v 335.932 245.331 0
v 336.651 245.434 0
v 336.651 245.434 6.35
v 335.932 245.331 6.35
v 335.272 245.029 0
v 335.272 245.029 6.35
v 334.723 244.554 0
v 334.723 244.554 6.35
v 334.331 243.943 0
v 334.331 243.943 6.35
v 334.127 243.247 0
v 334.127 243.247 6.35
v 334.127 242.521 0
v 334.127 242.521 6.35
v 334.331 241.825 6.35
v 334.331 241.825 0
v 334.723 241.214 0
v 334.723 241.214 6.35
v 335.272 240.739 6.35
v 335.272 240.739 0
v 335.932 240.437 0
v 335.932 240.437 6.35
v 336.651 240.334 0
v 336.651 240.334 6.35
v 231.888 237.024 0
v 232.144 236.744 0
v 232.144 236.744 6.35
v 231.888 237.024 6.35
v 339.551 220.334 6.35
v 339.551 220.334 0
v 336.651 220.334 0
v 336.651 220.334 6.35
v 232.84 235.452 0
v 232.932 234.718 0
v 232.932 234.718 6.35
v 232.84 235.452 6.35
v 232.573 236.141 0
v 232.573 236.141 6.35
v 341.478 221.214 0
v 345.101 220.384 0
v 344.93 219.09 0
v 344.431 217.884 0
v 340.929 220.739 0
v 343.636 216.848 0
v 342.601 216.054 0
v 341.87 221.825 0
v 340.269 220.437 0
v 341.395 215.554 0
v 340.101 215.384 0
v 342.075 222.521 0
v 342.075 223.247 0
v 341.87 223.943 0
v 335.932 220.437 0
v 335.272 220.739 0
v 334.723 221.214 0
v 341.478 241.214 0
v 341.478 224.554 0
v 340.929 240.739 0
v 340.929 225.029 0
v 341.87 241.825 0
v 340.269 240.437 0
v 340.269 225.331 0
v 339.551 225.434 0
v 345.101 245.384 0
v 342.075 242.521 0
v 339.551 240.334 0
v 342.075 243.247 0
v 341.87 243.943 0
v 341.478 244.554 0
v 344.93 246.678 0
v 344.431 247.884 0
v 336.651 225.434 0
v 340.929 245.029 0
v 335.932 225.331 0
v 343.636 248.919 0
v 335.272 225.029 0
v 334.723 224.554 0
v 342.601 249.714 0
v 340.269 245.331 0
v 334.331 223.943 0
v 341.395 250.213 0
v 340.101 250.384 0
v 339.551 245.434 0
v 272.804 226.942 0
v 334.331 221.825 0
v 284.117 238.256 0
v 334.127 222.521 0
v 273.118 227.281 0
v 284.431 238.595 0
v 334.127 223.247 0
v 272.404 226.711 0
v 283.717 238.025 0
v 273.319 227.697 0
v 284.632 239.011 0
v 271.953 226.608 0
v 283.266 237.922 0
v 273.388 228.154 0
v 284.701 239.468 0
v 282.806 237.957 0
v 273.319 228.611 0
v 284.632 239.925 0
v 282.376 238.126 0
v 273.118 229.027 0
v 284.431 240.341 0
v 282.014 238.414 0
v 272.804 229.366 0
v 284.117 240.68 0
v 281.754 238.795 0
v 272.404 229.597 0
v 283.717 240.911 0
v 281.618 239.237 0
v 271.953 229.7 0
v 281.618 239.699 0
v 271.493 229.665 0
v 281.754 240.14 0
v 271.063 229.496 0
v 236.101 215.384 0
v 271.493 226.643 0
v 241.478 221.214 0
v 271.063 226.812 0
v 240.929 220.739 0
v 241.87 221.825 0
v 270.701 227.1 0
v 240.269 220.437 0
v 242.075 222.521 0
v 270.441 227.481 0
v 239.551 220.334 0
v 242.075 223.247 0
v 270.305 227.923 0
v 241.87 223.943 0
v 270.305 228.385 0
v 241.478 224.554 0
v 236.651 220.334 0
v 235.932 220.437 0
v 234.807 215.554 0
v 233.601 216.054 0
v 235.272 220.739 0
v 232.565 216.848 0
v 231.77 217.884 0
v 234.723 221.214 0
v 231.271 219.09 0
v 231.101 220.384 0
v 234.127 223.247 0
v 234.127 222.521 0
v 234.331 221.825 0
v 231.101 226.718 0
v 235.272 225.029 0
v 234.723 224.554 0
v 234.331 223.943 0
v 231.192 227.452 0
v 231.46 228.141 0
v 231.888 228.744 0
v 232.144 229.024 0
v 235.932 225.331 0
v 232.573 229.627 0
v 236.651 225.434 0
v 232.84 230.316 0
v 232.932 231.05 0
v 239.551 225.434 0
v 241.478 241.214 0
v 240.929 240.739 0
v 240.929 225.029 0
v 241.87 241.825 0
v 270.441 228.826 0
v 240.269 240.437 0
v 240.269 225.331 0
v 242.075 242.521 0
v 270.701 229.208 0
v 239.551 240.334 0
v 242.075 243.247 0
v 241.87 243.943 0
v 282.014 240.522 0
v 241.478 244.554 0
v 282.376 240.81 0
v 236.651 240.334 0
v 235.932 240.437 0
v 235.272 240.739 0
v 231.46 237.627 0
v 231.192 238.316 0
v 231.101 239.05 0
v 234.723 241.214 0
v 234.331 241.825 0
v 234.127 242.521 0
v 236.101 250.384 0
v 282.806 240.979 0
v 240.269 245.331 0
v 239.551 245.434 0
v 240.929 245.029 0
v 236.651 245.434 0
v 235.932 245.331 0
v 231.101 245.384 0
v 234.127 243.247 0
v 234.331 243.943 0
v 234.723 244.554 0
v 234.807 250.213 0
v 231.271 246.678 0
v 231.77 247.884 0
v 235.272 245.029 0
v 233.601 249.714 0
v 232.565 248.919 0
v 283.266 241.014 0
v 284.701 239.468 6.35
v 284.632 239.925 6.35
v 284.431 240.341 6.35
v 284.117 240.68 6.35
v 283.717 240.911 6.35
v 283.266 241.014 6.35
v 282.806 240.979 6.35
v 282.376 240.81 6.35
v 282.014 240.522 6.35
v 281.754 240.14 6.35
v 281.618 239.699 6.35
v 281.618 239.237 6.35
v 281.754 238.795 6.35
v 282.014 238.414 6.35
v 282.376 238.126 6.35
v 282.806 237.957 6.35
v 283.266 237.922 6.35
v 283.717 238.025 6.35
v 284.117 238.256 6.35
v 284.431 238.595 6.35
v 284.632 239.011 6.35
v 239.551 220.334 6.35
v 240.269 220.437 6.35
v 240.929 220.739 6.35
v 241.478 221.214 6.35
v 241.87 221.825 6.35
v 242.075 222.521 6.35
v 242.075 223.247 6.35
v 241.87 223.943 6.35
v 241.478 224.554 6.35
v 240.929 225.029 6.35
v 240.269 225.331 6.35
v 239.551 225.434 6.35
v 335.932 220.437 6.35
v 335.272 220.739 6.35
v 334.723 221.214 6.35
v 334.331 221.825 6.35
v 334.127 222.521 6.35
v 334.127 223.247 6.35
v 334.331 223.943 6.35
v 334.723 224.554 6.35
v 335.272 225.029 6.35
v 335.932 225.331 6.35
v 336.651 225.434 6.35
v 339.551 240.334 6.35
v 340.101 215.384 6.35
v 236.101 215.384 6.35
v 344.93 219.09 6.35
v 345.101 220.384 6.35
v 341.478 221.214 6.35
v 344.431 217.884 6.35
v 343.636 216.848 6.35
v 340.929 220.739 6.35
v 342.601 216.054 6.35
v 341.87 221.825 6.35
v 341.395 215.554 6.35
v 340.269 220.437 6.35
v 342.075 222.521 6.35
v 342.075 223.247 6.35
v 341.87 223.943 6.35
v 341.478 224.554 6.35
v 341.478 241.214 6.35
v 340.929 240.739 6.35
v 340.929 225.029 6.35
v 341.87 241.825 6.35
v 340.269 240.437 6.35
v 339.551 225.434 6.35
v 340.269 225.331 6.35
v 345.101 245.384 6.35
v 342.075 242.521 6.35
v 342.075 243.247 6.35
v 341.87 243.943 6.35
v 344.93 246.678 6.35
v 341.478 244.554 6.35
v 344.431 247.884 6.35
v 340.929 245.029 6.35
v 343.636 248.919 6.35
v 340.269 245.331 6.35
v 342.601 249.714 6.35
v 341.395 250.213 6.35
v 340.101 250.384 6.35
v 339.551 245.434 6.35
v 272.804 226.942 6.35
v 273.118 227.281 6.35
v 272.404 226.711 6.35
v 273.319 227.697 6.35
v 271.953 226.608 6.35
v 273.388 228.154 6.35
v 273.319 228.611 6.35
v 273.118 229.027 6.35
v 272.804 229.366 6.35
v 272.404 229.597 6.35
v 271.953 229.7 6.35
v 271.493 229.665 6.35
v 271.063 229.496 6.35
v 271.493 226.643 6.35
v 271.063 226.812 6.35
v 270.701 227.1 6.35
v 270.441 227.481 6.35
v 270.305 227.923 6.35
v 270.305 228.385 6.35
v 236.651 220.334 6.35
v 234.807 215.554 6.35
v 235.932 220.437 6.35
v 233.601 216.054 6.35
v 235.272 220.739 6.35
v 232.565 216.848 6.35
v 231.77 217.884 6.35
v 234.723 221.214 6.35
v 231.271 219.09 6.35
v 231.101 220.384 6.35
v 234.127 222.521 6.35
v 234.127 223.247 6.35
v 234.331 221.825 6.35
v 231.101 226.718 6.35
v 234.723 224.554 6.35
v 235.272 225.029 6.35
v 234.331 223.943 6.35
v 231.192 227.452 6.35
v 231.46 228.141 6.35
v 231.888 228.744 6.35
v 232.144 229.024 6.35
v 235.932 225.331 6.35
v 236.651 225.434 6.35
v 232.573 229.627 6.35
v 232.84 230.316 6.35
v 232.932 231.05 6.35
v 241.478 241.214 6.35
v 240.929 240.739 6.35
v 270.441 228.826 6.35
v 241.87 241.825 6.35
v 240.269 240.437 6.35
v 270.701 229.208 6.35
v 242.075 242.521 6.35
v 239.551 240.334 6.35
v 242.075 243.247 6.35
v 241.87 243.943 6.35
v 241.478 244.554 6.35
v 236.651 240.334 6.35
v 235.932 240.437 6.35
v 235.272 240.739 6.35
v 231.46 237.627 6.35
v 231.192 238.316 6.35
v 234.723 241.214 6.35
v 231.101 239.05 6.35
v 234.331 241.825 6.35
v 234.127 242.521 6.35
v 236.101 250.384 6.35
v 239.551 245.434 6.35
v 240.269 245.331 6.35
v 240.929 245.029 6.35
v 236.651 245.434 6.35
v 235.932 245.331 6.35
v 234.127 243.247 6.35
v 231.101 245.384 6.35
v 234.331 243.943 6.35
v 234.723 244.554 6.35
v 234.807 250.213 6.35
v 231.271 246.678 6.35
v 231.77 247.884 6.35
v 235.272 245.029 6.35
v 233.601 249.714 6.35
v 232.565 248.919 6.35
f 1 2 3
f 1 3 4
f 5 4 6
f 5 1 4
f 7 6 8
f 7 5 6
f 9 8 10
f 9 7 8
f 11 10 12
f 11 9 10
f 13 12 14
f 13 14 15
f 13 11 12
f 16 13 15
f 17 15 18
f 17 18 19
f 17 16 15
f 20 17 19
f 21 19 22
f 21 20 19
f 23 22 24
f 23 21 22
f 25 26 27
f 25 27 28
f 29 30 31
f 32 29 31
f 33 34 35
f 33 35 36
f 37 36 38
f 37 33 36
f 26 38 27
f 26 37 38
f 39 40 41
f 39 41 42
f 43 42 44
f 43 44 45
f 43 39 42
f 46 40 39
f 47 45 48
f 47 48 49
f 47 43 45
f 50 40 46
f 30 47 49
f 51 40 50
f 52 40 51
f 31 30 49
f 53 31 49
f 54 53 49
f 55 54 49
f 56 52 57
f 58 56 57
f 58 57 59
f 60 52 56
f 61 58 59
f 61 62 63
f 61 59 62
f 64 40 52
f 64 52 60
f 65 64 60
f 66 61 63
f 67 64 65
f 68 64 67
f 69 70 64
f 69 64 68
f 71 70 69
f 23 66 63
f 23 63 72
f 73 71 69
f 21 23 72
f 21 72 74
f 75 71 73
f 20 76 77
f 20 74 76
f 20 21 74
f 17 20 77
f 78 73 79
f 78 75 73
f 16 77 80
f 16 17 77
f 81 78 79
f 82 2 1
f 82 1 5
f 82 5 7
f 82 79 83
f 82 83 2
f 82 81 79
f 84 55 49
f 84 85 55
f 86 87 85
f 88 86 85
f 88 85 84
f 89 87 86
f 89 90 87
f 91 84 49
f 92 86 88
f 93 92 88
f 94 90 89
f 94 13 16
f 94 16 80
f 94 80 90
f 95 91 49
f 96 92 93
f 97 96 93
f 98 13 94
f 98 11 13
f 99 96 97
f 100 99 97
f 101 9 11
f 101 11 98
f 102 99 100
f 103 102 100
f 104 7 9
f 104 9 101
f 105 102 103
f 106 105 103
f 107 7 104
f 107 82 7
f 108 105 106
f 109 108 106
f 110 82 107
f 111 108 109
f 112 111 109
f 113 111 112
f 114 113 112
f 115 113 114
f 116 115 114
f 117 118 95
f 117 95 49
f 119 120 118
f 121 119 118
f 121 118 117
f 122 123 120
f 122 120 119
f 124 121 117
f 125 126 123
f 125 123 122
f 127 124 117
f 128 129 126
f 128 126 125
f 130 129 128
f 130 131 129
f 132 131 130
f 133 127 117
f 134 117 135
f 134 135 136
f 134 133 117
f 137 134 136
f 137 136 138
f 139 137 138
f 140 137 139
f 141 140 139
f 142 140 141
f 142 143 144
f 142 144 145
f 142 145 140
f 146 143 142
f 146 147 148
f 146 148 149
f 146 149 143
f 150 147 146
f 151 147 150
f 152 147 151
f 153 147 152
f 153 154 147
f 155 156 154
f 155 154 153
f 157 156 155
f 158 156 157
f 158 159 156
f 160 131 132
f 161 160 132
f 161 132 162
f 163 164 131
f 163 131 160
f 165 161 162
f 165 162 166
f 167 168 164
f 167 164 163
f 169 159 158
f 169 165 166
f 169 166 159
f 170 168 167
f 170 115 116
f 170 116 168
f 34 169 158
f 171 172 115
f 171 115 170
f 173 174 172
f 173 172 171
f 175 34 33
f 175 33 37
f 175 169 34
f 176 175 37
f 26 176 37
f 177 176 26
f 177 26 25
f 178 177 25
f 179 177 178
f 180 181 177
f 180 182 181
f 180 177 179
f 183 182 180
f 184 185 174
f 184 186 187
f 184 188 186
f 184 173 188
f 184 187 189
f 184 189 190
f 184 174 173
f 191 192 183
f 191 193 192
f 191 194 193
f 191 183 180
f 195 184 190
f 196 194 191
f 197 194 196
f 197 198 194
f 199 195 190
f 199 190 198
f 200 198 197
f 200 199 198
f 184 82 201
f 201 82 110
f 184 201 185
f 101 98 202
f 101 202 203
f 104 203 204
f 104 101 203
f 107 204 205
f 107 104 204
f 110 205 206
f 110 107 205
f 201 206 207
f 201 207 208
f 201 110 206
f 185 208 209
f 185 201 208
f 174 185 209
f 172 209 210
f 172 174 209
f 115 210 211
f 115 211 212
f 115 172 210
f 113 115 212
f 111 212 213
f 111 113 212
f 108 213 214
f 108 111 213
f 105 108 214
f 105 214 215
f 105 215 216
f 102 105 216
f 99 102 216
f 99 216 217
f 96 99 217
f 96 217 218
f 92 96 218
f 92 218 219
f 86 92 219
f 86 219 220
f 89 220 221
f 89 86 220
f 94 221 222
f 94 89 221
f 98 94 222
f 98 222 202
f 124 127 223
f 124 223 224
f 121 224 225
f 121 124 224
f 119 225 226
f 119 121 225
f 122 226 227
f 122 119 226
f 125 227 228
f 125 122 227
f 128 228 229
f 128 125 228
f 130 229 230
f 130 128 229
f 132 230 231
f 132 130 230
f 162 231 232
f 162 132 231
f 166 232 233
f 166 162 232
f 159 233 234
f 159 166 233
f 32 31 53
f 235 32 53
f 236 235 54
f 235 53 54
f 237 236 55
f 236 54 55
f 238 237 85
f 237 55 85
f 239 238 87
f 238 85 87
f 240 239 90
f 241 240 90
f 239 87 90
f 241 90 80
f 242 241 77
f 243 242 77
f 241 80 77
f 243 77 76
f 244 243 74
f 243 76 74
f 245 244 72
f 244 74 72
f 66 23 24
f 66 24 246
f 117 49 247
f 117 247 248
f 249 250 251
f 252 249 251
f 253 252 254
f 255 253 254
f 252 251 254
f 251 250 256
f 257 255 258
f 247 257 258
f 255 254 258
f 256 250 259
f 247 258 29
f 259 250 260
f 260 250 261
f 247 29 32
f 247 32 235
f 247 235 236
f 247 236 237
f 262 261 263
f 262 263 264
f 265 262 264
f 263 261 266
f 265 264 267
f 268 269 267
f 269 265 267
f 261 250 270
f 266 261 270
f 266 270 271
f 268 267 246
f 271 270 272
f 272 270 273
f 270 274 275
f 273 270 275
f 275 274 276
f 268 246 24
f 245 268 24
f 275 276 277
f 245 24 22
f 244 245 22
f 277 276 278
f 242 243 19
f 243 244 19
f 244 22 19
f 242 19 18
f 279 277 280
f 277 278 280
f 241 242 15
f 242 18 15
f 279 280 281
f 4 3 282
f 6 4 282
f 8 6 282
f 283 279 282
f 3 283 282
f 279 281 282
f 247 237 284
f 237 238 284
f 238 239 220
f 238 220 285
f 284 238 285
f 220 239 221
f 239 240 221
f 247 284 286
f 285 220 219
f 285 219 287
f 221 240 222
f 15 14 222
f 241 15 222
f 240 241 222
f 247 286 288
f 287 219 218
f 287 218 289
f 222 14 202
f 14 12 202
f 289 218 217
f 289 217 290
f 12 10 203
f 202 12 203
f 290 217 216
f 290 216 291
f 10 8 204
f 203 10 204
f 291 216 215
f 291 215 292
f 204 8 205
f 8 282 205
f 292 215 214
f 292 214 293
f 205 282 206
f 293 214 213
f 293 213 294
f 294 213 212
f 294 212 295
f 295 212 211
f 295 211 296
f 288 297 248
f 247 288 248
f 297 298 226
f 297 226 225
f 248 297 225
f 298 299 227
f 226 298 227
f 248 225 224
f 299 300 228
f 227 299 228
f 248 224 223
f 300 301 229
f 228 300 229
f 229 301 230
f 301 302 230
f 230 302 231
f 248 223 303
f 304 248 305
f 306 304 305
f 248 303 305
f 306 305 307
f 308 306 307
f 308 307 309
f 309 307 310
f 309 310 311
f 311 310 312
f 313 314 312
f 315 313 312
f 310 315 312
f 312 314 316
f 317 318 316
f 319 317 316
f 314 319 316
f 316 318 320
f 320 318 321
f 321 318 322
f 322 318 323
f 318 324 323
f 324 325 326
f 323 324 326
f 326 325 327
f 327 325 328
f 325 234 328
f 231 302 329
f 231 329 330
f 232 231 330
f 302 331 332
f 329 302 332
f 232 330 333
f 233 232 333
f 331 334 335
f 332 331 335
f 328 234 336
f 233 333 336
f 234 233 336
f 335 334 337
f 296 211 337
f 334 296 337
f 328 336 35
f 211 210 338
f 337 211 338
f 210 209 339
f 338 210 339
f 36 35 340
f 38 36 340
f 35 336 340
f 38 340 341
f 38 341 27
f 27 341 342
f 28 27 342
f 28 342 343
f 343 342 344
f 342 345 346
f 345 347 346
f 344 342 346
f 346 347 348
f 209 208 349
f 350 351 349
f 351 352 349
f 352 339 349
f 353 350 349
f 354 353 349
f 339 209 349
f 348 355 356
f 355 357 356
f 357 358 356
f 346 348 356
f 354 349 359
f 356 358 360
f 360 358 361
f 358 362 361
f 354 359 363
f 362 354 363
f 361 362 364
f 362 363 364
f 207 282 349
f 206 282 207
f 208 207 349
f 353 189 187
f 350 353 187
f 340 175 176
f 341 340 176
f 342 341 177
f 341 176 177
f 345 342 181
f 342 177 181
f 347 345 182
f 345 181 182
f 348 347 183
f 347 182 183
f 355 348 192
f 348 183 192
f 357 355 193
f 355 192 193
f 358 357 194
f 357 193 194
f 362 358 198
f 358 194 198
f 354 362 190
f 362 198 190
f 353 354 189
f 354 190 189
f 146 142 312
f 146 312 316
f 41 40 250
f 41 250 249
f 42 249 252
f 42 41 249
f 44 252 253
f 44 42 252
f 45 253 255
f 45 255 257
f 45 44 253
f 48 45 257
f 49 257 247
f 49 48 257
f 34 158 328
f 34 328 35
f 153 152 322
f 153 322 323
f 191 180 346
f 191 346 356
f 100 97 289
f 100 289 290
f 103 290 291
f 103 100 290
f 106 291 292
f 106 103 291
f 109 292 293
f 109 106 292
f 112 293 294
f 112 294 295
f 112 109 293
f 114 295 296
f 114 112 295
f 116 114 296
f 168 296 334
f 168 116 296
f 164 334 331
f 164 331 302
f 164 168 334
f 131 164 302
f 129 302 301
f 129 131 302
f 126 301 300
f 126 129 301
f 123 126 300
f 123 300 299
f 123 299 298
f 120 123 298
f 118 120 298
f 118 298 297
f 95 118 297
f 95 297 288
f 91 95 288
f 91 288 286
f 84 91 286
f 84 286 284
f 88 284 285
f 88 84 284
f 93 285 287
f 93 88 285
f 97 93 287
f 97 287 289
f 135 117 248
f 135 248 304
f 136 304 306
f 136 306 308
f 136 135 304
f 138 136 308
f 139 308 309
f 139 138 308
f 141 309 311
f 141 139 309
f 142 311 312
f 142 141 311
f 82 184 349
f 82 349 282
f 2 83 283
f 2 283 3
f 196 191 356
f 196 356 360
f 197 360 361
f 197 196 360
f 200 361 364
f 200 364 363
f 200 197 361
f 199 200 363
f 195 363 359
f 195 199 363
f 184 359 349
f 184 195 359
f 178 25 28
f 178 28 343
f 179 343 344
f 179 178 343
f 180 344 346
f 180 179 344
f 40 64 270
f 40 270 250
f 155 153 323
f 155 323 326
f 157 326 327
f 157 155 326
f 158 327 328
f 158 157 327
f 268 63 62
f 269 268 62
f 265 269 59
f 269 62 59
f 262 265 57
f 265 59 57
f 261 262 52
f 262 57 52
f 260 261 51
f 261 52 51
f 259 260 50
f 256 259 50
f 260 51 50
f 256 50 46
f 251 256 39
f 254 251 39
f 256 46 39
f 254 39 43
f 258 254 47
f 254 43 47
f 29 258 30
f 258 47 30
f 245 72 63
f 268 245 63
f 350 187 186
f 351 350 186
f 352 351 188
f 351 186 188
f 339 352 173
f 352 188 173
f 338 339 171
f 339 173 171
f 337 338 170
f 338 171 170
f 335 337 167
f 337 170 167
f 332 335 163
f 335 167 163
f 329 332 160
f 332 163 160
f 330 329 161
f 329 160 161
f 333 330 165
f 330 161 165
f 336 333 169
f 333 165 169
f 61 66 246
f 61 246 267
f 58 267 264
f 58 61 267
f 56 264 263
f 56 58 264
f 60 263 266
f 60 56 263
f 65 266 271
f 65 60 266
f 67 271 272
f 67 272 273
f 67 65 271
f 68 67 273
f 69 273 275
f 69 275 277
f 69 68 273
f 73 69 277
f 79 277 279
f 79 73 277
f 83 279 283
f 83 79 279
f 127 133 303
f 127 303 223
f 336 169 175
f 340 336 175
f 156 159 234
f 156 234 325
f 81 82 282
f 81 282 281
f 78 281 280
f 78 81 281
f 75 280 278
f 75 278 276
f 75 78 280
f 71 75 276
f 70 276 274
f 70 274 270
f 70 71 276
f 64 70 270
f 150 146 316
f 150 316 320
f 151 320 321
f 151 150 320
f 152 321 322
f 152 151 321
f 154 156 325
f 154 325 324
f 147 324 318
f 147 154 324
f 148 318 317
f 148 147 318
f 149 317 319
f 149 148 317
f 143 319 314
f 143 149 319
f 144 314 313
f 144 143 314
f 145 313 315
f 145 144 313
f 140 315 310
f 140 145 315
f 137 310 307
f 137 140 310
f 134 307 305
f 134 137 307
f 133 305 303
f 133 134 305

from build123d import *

# Parameters (mm, degrees)
SKETCH1_R           = 1.549999999
BOSS_EXTRUDE1_DEPTH = 6.35


with BuildPart() as part:
    # Sketch1 → Boss-Extrude1 (new body)
    with BuildSketch(Plane.XY):
        with BuildLine():
            Line((231.100613802, 220.383854223), (231.100613802, 226.717998483))
            ThreePointArc((231.100613802, 226.717998483), (231.304344536, 227.804680676), (231.887865928, 228.743769162))
            Line((231.887865928, 228.743769162), (232.144361676, 229.023939287))
            ThreePointArc((232.144361676, 229.023939287), (232.727883068, 229.963027773), (232.931613801, 231.049709965))
            Line((232.931613801, 231.049709965), (232.931613801, 234.717998484))
            ThreePointArc((232.931613801, 234.717998484), (232.727883068, 235.804680676), (232.144361676, 236.743769162))
            Line((232.144361676, 236.743769162), (231.887865928, 237.023939287))
            ThreePointArc((231.887865928, 237.023939287), (231.304344536, 237.963027773), (231.100613802, 239.049709966))
            Line((231.100613802, 239.049709966), (231.100613802, 245.383854224))
            ThreePointArc((231.100613802, 245.383854224), (232.565079896, 248.91938813), (236.100613802, 250.383854224))
            Line((236.100613802, 250.383854224), (340.100613803, 250.383854224))
            ThreePointArc((340.100613803, 250.383854224), (343.636147709, 248.919388129), (345.100613803, 245.383854222))
            Line((345.100613803, 245.383854222), (345.100613803, 220.383854223))
            ThreePointArc((345.100613803, 220.383854223), (343.636147709, 216.848320317), (340.100613803, 215.383854223))
            Line((340.100613803, 215.383854223), (236.100613802, 215.383854223))
            ThreePointArc((236.100613802, 215.383854223), (232.565079896, 216.848320317), (231.100613802, 220.383854223))
        make_face()
        with Locations((271.837613804, 228.153854225)):
            Circle(SKETCH1_R, mode=Mode.SUBTRACT)
        with Locations((283.150613802, 239.467854223)):
            Circle(SKETCH1_R, mode=Mode.SUBTRACT)
        with BuildLine():
            Line((339.550613803, 220.333854223), (336.650613802, 220.333854223))
            ThreePointArc((336.650613802, 220.333854223), (334.100613802, 222.883854224), (336.650613802, 225.433854224))
            Line((336.650613802, 225.433854224), (339.550613803, 225.433854224))
            ThreePointArc((339.550613803, 225.433854224), (342.100613803, 222.883854224), (339.550613803, 220.333854223))
        make_face(mode=Mode.SUBTRACT)
        with BuildLine():
            Line((236.650613802, 220.333854223), (239.550613804, 220.333854223))
            ThreePointArc((239.550613804, 220.333854223), (242.100613804, 222.883854224), (239.550613804, 225.433854224))
            Line((239.550613804, 225.433854224), (236.650613802, 225.433854224))
            ThreePointArc((236.650613802, 225.433854224), (234.100613802, 222.883854224), (236.650613802, 220.333854223))
        make_face(mode=Mode.SUBTRACT)
        with BuildLine():
            Line((239.550613804, 240.333854223), (236.650613802, 240.333854223))
            ThreePointArc((236.650613802, 240.333854223), (234.100613802, 242.883854224), (236.650613802, 245.433854224))
            Line((236.650613802, 245.433854224), (239.550613804, 245.433854224))
            ThreePointArc((239.550613804, 245.433854224), (242.100613804, 242.883854224), (239.550613804, 240.333854223))
        make_face(mode=Mode.SUBTRACT)
        with BuildLine():
            Line((336.650613802, 240.333854223), (339.550613803, 240.333854223))
            ThreePointArc((339.550613803, 240.333854223), (342.100613803, 242.883854224), (339.550613803, 245.433854224))
            Line((339.550613803, 245.433854224), (336.650613802, 245.433854224))
            ThreePointArc((336.650613802, 245.433854224), (334.100613802, 242.883854224), (336.650613802, 240.333854223))
        make_face(mode=Mode.SUBTRACT)
    extrude(amount=BOSS_EXTRUDE1_DEPTH)


solid = part.part
